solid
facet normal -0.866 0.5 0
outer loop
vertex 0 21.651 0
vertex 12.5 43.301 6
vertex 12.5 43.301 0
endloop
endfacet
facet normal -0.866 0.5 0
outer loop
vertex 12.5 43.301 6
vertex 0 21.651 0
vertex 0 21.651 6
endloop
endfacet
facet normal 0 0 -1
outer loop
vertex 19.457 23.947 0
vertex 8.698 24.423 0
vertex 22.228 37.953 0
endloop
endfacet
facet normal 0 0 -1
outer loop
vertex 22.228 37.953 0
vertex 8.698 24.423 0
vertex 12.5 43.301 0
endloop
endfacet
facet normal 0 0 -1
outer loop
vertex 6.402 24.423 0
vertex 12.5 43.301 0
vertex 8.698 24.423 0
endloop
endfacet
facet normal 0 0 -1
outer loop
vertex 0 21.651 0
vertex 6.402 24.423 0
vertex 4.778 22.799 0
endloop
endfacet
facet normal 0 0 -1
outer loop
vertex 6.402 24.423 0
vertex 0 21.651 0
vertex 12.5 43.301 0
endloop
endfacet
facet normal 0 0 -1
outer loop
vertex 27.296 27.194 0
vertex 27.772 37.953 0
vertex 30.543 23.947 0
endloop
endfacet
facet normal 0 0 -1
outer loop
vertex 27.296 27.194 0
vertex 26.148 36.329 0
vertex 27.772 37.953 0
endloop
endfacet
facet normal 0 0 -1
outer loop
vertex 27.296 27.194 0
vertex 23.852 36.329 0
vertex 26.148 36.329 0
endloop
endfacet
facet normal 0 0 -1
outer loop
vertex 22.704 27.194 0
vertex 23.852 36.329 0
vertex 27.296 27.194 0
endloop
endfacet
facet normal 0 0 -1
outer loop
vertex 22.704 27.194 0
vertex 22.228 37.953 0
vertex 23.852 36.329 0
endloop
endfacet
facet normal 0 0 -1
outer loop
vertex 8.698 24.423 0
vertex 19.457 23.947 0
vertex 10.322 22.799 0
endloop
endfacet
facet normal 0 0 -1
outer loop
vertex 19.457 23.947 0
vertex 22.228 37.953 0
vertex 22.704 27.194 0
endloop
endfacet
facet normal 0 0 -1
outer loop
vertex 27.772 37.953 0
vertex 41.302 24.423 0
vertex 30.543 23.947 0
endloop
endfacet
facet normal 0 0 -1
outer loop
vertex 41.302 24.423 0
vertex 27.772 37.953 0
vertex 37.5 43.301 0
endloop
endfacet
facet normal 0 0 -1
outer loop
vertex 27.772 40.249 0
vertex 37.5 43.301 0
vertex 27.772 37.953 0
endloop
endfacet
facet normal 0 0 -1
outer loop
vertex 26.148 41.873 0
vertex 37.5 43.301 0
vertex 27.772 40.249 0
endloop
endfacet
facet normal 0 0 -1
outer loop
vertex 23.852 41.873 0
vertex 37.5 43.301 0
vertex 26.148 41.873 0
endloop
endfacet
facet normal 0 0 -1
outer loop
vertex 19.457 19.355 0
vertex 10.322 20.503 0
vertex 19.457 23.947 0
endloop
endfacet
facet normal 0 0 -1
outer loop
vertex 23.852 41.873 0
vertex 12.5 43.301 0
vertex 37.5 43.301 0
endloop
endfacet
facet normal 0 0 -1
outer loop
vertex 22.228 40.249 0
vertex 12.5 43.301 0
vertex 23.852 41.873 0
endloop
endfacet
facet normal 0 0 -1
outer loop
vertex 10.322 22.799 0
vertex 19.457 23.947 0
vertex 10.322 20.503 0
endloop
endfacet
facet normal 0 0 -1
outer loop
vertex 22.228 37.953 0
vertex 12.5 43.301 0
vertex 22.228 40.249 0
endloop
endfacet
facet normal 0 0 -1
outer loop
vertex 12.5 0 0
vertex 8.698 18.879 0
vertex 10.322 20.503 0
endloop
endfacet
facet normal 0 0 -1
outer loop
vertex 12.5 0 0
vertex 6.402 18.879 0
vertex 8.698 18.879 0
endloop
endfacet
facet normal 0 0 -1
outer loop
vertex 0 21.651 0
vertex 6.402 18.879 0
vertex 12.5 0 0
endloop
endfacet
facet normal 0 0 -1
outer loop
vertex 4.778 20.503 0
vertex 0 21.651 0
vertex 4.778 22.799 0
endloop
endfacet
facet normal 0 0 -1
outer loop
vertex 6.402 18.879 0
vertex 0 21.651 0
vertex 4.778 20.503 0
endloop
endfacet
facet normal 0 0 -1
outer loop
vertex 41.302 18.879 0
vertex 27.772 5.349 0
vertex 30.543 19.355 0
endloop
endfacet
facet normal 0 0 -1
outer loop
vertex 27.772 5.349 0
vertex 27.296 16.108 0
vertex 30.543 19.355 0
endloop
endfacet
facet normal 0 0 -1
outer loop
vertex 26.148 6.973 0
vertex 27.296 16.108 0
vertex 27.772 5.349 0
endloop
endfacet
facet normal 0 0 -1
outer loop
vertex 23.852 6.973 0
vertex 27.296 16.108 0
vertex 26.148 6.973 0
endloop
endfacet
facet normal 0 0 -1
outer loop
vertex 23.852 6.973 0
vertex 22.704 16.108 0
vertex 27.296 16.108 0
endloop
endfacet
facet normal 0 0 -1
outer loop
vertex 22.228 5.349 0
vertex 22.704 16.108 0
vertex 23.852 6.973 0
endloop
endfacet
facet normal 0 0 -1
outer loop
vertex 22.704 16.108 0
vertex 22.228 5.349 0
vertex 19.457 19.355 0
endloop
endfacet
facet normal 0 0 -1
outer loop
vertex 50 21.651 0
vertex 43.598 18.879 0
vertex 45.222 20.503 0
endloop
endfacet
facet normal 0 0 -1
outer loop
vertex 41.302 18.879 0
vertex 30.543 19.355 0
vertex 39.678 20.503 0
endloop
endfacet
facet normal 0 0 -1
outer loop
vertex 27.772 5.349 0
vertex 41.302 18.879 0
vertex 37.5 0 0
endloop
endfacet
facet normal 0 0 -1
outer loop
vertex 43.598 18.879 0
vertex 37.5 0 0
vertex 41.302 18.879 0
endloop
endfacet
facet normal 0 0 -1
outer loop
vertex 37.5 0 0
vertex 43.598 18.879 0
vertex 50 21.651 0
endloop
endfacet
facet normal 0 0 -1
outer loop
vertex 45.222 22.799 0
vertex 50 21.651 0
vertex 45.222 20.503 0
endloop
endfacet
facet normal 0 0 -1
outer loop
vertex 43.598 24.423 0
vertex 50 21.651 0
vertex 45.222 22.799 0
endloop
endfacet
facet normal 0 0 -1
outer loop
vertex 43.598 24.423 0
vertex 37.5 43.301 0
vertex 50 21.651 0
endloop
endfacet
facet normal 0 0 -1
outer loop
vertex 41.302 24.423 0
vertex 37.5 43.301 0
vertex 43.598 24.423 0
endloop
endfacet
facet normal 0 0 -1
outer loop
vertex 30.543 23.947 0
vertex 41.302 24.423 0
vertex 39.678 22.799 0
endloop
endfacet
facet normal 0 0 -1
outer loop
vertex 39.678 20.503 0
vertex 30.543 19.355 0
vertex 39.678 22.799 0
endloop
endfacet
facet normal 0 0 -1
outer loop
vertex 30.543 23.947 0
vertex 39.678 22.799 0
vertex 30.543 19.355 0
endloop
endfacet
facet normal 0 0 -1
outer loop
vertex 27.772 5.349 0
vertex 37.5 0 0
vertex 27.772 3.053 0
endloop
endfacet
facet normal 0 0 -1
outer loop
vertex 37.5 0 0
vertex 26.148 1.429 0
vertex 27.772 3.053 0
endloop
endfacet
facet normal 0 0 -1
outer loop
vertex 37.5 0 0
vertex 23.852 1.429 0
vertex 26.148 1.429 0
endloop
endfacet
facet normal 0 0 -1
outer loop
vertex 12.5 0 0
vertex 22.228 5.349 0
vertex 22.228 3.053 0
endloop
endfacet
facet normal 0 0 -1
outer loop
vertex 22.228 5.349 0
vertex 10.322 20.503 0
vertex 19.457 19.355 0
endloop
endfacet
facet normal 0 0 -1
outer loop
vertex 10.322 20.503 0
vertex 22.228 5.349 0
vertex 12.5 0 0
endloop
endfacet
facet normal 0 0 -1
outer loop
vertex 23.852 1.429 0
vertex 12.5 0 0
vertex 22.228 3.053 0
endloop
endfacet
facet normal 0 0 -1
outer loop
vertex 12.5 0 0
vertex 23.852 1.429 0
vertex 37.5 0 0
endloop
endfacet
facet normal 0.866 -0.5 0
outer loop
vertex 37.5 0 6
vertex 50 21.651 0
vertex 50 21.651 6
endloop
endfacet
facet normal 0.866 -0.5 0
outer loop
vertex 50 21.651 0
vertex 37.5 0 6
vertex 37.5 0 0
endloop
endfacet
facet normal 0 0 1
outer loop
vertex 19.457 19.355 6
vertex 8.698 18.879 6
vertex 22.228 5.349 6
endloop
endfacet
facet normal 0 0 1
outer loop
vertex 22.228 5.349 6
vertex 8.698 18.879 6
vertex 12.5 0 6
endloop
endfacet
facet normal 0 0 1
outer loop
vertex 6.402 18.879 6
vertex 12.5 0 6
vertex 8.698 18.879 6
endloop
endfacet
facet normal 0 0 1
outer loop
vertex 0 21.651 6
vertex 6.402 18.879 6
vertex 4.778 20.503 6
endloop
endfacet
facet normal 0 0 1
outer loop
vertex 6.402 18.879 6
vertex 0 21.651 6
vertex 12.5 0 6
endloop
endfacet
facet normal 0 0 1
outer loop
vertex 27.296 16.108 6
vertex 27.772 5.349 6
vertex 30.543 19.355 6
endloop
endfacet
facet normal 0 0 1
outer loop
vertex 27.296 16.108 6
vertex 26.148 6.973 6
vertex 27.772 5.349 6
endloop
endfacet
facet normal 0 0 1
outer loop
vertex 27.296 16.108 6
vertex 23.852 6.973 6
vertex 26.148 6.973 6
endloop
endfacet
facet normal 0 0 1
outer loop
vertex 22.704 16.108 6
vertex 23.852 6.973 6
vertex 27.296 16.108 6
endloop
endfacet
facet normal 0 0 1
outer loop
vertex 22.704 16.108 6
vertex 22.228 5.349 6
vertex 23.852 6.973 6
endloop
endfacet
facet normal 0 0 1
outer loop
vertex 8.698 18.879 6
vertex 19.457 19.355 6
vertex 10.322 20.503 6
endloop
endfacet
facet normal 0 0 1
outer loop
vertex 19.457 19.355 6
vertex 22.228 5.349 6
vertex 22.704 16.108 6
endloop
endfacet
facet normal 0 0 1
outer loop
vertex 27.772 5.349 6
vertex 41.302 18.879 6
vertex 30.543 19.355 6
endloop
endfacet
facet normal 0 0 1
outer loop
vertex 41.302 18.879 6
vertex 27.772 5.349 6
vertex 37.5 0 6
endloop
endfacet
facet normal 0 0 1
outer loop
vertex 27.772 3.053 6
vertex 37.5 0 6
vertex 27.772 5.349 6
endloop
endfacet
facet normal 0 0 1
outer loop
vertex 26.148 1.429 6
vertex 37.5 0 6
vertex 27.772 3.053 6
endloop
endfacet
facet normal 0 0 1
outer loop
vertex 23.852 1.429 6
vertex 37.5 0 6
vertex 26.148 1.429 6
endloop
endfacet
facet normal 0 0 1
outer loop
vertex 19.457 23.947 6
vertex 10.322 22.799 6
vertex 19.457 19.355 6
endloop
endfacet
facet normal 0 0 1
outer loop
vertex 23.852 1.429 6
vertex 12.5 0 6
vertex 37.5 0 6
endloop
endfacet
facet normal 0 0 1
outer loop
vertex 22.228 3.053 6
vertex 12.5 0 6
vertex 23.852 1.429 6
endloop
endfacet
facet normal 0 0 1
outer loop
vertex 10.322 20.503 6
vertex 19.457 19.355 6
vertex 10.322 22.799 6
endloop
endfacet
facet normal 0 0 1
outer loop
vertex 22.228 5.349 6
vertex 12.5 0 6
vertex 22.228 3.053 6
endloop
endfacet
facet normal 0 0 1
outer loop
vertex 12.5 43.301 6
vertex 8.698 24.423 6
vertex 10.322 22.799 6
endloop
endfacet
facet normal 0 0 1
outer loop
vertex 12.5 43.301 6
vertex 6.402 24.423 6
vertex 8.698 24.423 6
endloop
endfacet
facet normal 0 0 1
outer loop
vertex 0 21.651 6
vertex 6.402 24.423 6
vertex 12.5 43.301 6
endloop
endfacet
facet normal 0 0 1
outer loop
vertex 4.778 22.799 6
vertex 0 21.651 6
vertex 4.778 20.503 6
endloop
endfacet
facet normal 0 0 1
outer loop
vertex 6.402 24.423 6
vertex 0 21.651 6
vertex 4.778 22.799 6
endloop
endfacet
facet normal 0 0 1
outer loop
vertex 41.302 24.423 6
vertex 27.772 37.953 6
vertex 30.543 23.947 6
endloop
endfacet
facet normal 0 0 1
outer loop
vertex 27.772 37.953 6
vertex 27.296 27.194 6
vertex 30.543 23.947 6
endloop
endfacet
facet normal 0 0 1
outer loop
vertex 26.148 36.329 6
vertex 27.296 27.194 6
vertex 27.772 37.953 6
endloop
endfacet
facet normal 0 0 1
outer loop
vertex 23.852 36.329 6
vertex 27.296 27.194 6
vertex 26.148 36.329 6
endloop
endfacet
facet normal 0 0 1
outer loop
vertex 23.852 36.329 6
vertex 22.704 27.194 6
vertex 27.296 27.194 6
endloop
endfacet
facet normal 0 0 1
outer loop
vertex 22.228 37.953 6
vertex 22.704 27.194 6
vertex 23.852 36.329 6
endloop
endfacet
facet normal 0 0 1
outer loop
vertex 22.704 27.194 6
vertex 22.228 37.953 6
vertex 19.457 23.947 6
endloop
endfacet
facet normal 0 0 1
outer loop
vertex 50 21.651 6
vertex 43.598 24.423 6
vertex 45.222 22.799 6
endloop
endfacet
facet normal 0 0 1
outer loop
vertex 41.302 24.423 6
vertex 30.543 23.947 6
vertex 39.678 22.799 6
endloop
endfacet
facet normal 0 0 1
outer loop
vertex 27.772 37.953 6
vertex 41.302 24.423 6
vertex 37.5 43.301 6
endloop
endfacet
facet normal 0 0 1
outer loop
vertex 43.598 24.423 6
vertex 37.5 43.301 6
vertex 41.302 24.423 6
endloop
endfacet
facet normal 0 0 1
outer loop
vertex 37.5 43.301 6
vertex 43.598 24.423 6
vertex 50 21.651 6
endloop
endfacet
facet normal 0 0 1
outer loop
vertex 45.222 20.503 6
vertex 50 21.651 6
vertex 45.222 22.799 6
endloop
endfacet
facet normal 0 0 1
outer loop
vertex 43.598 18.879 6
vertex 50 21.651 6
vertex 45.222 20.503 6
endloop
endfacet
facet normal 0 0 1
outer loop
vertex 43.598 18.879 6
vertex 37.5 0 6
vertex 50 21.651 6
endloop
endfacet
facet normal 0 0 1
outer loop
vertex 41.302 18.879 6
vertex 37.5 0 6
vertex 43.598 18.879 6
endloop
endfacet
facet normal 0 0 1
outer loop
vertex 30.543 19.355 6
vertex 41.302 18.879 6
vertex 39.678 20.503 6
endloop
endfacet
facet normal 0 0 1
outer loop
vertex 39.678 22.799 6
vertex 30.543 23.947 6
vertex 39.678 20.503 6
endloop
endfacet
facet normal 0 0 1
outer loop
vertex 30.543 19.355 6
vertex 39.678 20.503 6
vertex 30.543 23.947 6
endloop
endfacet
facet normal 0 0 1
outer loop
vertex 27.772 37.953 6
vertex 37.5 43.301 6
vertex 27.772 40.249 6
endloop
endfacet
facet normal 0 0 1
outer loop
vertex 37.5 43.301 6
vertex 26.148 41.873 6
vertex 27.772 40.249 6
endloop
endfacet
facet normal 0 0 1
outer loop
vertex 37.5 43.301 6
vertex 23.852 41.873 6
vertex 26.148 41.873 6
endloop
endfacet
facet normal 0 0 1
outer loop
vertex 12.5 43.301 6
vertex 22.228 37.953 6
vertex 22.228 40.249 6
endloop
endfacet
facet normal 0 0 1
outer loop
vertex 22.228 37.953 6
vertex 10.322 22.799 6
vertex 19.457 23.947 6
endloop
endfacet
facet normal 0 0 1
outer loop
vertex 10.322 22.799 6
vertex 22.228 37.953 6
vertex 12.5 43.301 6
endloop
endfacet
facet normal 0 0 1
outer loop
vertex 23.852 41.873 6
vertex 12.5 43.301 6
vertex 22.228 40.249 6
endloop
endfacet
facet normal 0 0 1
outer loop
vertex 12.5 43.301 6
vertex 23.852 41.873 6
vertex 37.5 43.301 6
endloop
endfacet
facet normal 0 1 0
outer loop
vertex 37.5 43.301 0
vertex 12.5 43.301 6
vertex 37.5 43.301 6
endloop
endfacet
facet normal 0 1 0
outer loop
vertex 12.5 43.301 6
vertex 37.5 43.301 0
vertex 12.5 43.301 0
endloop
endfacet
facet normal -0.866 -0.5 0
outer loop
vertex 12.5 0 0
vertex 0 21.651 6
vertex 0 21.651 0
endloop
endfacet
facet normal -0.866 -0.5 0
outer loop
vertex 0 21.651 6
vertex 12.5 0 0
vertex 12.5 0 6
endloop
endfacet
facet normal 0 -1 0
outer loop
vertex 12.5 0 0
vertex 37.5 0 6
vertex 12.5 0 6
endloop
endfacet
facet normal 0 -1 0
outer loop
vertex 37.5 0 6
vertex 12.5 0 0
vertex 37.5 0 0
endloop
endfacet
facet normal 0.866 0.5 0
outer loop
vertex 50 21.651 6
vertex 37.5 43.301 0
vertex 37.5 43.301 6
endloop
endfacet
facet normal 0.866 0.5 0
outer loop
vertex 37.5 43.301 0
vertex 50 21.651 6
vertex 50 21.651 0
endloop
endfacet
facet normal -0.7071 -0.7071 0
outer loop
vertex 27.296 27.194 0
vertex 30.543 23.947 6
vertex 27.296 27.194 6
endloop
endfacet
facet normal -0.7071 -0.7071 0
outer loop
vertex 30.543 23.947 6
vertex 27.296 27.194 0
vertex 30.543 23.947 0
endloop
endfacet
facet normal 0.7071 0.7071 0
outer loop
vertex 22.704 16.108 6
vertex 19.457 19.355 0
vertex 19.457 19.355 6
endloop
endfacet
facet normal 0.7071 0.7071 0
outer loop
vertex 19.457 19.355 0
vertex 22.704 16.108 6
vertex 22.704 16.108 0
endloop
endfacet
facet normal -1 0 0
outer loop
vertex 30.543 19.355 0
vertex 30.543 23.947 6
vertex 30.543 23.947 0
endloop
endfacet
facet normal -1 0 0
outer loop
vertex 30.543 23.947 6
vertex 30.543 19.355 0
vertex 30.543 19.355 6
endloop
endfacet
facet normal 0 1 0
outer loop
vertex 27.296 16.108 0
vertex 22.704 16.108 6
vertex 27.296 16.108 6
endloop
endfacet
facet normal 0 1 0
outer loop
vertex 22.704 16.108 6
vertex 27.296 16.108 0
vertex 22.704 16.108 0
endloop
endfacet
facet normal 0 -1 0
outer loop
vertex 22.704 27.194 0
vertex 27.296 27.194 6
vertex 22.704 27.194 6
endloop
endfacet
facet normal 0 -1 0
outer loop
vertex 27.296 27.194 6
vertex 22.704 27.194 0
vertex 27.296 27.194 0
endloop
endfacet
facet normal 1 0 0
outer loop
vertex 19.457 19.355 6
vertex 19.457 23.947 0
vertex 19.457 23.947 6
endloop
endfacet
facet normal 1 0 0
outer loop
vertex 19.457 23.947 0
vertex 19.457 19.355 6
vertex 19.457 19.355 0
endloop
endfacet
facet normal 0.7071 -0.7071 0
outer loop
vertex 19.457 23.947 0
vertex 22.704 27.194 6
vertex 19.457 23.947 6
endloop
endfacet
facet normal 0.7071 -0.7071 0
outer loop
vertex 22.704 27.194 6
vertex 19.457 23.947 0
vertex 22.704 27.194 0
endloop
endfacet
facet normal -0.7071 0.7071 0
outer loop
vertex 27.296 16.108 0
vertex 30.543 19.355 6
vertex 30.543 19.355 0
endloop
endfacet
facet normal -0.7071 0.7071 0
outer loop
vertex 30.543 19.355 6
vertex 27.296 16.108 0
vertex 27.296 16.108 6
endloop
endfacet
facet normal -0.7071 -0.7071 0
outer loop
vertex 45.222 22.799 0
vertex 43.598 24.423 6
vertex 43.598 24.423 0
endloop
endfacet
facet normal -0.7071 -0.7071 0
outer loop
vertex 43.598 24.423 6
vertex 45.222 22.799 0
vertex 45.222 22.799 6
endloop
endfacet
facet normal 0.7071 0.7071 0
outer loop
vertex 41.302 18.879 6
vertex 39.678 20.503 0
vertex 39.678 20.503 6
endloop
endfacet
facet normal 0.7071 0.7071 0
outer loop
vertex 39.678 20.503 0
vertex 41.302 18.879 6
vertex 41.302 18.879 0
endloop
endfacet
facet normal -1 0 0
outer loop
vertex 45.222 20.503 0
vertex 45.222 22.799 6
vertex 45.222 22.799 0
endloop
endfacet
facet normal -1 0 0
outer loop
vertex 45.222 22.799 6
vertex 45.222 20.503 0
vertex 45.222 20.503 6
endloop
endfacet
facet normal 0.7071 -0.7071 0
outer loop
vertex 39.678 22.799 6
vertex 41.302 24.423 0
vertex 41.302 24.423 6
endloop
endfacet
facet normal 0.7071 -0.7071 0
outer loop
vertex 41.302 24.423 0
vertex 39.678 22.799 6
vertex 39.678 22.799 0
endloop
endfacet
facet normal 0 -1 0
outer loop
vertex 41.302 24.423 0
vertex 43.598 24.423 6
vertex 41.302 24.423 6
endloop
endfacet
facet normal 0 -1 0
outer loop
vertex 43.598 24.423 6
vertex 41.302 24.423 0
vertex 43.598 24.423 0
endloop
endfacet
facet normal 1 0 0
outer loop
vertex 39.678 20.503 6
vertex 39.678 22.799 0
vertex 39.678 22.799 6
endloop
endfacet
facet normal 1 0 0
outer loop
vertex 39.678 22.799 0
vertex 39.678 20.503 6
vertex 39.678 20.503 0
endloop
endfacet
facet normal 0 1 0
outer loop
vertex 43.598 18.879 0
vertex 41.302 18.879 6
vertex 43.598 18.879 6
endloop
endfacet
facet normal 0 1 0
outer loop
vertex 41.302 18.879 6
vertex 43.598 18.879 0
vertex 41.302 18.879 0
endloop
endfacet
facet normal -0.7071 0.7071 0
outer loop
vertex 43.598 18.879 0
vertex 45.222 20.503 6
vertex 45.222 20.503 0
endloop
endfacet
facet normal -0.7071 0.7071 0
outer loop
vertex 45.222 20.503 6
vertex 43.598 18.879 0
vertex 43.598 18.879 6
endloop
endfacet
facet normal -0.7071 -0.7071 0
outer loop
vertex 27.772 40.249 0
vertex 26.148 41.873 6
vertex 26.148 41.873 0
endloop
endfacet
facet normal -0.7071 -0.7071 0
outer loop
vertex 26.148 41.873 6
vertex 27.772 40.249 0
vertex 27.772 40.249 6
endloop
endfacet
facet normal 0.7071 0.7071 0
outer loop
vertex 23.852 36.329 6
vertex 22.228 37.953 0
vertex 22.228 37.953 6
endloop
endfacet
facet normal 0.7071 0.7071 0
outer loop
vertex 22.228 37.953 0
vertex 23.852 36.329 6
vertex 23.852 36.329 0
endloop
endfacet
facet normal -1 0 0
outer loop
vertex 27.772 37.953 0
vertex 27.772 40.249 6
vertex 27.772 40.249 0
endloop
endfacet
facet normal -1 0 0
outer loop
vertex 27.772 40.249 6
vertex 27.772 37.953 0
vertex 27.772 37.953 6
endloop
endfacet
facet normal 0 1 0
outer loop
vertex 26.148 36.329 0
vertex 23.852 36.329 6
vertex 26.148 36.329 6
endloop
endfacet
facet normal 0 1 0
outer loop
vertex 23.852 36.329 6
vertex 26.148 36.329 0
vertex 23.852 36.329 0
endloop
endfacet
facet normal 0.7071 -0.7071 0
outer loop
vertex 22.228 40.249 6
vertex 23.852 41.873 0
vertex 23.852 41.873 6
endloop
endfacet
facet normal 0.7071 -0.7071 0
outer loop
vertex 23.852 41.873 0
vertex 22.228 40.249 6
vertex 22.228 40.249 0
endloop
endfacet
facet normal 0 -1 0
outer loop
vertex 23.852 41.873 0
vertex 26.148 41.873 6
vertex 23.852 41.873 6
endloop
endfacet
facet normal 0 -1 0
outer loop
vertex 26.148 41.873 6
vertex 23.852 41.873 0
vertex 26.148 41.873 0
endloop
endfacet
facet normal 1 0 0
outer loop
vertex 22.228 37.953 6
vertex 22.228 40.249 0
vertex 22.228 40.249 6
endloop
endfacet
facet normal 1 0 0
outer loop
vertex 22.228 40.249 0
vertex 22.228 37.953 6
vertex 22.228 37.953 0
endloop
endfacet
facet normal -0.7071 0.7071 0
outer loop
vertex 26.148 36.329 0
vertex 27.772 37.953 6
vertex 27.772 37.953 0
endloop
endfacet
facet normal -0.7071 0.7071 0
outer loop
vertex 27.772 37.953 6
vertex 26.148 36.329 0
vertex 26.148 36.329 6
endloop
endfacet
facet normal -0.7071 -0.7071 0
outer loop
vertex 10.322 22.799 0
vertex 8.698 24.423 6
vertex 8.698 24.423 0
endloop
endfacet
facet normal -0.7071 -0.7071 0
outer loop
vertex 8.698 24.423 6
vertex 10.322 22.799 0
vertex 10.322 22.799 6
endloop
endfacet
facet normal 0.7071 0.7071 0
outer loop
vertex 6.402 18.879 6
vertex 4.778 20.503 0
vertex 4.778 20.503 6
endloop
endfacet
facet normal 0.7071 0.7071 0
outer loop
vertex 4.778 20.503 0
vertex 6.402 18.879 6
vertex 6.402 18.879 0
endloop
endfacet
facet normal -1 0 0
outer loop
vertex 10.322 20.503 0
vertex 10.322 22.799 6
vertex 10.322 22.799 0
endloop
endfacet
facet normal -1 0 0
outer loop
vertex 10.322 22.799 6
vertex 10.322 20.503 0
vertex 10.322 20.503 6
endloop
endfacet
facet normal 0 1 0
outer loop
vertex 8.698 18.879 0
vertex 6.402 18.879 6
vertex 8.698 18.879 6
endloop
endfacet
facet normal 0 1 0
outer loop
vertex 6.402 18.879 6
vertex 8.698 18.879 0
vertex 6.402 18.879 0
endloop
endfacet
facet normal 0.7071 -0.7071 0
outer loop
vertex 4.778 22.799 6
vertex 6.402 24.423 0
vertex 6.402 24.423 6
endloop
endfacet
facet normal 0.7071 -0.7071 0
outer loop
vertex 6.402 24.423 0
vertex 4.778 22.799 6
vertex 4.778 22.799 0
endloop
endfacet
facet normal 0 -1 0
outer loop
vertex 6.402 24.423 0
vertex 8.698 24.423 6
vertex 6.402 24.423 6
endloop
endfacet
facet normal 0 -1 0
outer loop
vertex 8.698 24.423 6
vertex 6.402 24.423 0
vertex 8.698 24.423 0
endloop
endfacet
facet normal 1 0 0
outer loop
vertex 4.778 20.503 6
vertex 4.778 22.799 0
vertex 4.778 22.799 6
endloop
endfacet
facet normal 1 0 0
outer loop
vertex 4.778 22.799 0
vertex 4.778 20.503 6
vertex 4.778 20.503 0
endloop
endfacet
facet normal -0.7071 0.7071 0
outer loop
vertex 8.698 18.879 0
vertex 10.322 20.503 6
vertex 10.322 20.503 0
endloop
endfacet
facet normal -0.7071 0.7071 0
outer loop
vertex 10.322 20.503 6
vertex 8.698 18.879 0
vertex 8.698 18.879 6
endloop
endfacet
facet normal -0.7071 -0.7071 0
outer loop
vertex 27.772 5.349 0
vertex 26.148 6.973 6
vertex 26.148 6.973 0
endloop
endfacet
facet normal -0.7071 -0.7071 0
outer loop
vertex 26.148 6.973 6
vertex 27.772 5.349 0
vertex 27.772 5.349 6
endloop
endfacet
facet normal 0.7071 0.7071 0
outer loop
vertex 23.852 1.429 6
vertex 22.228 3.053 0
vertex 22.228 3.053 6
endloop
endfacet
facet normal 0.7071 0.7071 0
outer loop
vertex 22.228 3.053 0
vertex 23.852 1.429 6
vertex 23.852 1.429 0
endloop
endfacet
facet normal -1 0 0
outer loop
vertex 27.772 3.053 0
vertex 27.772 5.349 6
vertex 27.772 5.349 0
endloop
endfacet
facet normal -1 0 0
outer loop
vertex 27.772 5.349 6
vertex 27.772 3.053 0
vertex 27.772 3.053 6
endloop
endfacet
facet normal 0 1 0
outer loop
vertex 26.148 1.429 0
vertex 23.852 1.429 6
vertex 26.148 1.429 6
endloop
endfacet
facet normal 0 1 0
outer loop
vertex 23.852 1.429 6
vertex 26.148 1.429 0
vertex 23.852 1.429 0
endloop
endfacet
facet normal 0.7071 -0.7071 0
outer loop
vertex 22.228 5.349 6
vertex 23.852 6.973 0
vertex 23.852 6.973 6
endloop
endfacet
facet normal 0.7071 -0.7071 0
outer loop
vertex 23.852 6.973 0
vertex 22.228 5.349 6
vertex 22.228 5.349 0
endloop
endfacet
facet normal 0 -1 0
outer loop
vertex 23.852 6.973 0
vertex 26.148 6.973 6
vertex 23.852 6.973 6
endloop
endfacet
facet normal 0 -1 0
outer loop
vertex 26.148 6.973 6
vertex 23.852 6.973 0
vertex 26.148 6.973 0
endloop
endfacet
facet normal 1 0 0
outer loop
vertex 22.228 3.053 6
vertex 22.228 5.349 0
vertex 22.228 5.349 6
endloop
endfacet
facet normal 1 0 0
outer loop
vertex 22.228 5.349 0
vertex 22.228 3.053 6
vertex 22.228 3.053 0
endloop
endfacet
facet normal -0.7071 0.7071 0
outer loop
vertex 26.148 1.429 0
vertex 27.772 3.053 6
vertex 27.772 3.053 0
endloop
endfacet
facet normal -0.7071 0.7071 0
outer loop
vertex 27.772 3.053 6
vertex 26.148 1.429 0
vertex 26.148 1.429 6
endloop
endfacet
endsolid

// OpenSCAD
$fn = 32;

// ----------------------------------------------------------------------
// Polygon plate: 6-gon R25, 4 bolt windows
// ----------------------------------------------------------------------

// --- parameters (mm) ---
sides = 6;                // number of polygon sides
plate_r = 25;             // circumscribed radius of the polygon
bore_r = 6;               // centre bore radius
bolts = 4;                // number of bolt windows
ring_r = 17.45;           // bolt-circle radius
bolt_r = 3;               // bolt window radius
plate_t = 6;              // plate thickness, Z (extrusion height)

plate_d = 2 * plate_r;  // circumscribed diameter
bore_d = 2 * bore_r;  // centre bore diameter
bolt_d = 2 * bolt_r;  // bolt window diameter
ring_d = 2 * ring_r;  // bolt-circle diameter

profile = [[50, 21.651], [37.5, 43.301], [12.5, 43.301], [0, 21.651], [12.5, 0], [37.5, 0]];  // primary outline, 6 points, counter clockwise
void_1 = [[30.543, 23.947], [27.296, 27.194], [22.704, 27.194], [19.457, 23.947], [19.457, 19.355], [22.704, 16.108], [27.296, 16.108], [30.543, 19.355]];  // centre bore, 8 points
void_2 = [[45.222, 22.799], [43.598, 24.423], [41.302, 24.423], [39.678, 22.799], [39.678, 20.503], [41.302, 18.879], [43.598, 18.879], [45.222, 20.503]];  // bolt window 1, 8 points
void_3 = [[27.772, 40.249], [26.148, 41.873], [23.852, 41.873], [22.228, 40.249], [22.228, 37.953], [23.852, 36.329], [26.148, 36.329], [27.772, 37.953]];  // bolt window 2, 8 points
void_4 = [[10.322, 22.799], [8.698, 24.423], [6.402, 24.423], [4.778, 22.799], [4.778, 20.503], [6.402, 18.879], [8.698, 18.879], [10.322, 20.503]];  // bolt window 3, 8 points
void_5 = [[27.772, 5.349], [26.148, 6.973], [23.852, 6.973], [22.228, 5.349], [22.228, 3.053], [23.852, 1.429], [26.148, 1.429], [27.772, 3.053]];  // bolt window 4, 8 points

// --- the one profile operation ---
difference() {
  linear_extrude(height = plate_t) polygon(points = profile);
  translate([0, 0, -1])
    linear_extrude(height = plate_t + 2) polygon(points = void_1);
  translate([0, 0, -1])
    linear_extrude(height = plate_t + 2) polygon(points = void_2);
  translate([0, 0, -1])
    linear_extrude(height = plate_t + 2) polygon(points = void_3);
  translate([0, 0, -1])
    linear_extrude(height = plate_t + 2) polygon(points = void_4);
  translate([0, 0, -1])
    linear_extrude(height = plate_t + 2) polygon(points = void_5);
}
